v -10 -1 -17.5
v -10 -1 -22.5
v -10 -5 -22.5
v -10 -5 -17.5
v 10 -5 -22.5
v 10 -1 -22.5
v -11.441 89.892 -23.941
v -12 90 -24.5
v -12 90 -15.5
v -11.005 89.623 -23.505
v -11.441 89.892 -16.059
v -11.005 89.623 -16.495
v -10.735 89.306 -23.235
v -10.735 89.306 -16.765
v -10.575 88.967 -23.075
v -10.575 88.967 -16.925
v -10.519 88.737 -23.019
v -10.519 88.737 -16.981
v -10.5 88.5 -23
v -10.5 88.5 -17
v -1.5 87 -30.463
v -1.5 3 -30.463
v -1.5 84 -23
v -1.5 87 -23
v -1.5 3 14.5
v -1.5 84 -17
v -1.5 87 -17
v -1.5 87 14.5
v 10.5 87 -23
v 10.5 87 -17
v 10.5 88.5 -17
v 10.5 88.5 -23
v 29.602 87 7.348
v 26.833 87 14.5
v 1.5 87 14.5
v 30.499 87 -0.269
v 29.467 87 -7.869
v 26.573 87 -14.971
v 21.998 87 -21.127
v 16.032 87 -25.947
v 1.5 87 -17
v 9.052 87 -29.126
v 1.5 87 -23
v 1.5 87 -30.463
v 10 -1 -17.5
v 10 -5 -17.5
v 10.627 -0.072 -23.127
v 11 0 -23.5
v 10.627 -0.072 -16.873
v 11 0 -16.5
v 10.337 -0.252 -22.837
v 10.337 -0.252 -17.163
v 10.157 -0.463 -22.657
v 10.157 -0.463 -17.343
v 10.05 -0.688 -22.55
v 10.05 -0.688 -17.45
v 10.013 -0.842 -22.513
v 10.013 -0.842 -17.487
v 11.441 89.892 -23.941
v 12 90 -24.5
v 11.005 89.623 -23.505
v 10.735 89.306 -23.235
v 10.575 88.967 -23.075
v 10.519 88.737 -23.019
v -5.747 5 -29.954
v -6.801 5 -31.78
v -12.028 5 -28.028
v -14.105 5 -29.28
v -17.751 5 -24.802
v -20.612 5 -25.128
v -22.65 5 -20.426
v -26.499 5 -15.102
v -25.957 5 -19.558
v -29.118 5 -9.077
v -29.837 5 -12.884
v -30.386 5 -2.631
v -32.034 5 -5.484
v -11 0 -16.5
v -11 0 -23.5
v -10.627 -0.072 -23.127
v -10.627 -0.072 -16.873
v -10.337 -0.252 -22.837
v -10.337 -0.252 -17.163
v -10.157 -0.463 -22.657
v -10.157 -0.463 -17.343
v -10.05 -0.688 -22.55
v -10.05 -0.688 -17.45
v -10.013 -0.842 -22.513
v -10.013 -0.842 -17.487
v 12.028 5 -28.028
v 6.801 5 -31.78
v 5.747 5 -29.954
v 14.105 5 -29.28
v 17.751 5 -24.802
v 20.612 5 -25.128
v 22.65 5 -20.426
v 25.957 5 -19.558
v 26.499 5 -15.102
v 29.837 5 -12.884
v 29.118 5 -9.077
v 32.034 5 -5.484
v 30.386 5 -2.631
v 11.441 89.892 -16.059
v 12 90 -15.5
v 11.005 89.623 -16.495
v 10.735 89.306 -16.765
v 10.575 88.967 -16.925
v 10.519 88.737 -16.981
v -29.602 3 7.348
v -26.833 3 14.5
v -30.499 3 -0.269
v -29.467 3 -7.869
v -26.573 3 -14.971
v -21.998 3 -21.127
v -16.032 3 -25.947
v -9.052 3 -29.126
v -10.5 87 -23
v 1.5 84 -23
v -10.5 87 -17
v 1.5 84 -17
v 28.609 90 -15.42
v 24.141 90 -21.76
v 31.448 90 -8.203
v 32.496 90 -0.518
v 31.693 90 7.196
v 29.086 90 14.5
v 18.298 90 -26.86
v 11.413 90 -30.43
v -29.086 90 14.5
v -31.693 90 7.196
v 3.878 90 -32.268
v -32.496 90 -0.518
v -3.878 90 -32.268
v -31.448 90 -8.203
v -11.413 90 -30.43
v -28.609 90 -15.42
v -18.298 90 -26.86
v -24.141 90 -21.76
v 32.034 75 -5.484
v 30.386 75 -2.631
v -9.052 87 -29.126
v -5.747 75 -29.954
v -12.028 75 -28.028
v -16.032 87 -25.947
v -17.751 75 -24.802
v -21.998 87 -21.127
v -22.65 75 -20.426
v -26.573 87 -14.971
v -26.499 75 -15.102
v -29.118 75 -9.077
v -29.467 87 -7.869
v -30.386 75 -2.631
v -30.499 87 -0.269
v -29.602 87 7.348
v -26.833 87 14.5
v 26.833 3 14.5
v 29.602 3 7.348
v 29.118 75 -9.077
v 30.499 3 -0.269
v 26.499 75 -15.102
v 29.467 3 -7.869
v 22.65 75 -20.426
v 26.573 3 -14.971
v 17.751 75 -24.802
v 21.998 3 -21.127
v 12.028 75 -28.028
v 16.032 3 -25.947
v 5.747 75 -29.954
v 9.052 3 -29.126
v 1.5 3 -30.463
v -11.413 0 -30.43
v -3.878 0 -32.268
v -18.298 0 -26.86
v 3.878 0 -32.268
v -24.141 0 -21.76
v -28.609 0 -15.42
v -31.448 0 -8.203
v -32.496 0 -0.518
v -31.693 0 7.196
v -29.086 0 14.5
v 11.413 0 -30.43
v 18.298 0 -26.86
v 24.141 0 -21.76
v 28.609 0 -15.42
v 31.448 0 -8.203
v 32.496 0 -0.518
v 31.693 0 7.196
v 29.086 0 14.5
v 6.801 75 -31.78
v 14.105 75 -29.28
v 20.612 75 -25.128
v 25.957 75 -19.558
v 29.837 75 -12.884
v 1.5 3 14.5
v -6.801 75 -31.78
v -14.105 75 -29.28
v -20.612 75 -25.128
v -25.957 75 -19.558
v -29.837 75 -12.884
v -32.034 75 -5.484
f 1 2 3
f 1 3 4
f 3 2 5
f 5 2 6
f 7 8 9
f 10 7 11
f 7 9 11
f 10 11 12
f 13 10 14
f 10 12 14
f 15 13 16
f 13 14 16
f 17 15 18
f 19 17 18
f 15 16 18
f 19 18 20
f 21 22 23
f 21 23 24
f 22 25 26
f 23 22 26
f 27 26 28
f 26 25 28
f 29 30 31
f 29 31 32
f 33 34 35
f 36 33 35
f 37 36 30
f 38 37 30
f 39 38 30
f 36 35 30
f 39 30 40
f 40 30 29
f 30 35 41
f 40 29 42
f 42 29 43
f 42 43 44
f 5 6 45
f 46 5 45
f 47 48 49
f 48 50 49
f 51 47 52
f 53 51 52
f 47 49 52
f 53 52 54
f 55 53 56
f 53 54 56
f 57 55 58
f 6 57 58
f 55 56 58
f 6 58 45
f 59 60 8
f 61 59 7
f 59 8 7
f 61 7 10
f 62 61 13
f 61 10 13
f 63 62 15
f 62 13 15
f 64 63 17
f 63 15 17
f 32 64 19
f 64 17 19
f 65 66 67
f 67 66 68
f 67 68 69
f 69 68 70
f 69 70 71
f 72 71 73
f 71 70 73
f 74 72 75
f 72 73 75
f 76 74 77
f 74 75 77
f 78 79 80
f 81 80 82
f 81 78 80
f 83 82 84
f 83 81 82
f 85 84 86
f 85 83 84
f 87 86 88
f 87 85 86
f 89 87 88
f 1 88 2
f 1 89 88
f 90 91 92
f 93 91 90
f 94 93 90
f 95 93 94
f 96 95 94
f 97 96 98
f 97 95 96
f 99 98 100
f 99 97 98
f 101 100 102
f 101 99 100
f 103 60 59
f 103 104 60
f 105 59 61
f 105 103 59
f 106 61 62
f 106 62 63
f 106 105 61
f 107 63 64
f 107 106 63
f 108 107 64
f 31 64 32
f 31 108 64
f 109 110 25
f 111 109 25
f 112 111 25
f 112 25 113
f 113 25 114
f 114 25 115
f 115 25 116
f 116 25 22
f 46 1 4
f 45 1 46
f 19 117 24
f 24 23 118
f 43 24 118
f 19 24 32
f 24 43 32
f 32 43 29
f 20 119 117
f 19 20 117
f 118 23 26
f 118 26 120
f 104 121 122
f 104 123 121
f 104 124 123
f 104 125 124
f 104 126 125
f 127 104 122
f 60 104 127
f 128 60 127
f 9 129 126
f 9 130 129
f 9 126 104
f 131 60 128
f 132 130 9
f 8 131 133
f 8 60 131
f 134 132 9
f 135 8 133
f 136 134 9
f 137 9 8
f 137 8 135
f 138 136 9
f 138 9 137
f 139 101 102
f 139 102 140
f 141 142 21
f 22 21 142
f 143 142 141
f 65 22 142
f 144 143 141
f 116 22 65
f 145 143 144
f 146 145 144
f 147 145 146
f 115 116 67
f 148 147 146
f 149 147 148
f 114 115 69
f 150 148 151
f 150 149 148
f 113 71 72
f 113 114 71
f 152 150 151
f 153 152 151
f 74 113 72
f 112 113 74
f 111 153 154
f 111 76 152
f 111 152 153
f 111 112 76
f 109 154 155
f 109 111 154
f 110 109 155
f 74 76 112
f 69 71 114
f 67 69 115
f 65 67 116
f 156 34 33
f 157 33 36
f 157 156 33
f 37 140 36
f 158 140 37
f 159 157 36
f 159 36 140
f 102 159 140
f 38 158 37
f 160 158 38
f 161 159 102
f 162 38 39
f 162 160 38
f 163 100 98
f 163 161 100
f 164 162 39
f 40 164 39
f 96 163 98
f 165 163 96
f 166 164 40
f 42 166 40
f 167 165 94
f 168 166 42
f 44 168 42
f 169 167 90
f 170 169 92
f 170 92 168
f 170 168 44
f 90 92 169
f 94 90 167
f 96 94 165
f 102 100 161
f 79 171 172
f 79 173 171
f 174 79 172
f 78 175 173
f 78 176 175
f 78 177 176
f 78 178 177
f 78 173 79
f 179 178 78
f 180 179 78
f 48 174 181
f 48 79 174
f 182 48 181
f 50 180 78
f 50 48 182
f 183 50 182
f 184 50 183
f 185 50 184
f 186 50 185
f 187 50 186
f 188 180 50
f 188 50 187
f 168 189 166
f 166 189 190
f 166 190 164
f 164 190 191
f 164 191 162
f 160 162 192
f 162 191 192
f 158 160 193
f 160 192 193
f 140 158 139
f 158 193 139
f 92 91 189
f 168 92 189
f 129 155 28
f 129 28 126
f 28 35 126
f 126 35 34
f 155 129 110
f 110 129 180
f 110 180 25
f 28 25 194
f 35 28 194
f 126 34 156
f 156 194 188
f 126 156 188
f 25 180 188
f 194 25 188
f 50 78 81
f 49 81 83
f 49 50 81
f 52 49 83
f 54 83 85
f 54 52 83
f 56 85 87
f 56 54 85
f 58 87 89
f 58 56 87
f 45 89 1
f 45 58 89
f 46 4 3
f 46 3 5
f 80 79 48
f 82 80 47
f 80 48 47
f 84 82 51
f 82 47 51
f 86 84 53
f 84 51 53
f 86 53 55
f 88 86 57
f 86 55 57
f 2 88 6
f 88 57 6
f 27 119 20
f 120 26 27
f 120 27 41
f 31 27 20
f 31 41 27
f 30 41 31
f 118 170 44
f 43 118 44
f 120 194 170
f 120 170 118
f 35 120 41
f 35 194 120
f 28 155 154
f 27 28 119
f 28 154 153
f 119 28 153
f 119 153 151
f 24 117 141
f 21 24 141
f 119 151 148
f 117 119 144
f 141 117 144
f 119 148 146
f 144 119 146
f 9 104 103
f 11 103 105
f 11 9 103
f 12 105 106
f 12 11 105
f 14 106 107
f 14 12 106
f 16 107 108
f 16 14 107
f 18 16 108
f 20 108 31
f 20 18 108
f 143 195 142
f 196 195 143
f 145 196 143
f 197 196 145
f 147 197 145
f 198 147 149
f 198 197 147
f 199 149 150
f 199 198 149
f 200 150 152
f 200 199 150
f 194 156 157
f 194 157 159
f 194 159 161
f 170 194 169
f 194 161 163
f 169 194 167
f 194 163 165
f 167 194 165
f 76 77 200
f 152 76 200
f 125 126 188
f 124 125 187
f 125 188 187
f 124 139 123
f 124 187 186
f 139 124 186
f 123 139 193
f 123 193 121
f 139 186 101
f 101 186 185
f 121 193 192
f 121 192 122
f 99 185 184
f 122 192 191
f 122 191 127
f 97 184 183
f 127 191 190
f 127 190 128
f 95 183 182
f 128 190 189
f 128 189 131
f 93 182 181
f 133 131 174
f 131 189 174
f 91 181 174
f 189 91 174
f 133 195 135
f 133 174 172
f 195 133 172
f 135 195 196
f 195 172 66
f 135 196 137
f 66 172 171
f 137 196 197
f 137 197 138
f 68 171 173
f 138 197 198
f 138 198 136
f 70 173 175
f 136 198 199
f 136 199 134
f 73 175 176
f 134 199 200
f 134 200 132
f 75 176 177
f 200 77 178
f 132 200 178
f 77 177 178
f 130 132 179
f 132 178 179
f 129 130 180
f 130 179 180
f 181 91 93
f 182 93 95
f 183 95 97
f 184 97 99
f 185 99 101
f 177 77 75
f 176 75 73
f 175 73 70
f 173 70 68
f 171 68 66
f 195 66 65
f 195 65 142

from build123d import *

# Parameters (mm, degrees)
SKETCH1_R                       = 32.5
SKETCH1_R_2                     = 30.5
CYLINDER_BULK_EXTRUDE_DEPTH     = 90
TOP_START                       = -3
SKETCH2_R                       = 32.5
TOP_LID_DEPTH                   = 3
SKETCH3_R                       = 32.5
BOTTOM_LID_DEPTH                = 3
REAR_ACCESS_CUT_DEPTH           = 102.056914657
REAR_ACCESS_CUT_DEPTH_BACK      = 102.056914657
SKETCH5_W                       = 58.172158288
SKETCH5_H                       = 18
SKETCH8_W                       = 70
SKETCH8_H                       = 35
WEIGHT_RELIEF_PT1_DEPTH         = 102.056914657
CENTER_STIFFNESS_RIB_REACH      = 108.608
CENTER_STIFFNESS_RIB_END_RADIUS = 30.5
SKETCH6_W                       = 3
SKETCH6_H                       = 90
ALIGNMENT_SLOT_CUT_DEPTH        = 102.056914657
ALIGNMENT_SLOT_CUT_DEPTH_BACK   = 6
SKETCH4_W                       = 21
SKETCH4_H                       = 6
FILLET1_R                       = 1.5
SKETCH9_W                       = 20
SKETCH9_H                       = 5
ALIGNMENT_PEG_DEPTH             = 5
FILLET2_R                       = 1


with BuildPart() as part:
    # Sketch1 → CYLINDER BULK EXTRUDE (new body)
    with BuildSketch(Plane(origin=(0, 0, 0), x_dir=(1, 0, 0), z_dir=(0, 1, 0))):
        with Locations(Location((0, 0, 0), (0, 0, 90))):
            Circle(SKETCH1_R)
        with Locations(Location((0, 0, 0), (0, 0, 90))):
            Circle(SKETCH1_R_2, mode=Mode.SUBTRACT)
    extrude(amount=CYLINDER_BULK_EXTRUDE_DEPTH)

    # Sketch2 → TOP LID (add)
    with BuildSketch(Plane(origin=(0, 90, 0), x_dir=(1, 0, 0), z_dir=(0, 1, 0)).offset(TOP_START)):
        with Locations(Location((0, 0, 0), (0, 0, 90))):
            Circle(SKETCH2_R)
    extrude(amount=TOP_LID_DEPTH)

    # Sketch3 → BOTTOM LID (add)
    with BuildSketch(Plane.XZ):
        with Locations(Location((0, 0, 0), (0, 0, 270))):
            Circle(SKETCH3_R)
    extrude(amount=-BOTTOM_LID_DEPTH)

    # Sketch5 → REAR ACCESS CUT (cut, two sides: drawn at the far end of the back side and taken through both)
    with BuildSketch(Plane(origin=(0, 90, 0), x_dir=(1, 0, 0), z_dir=(0, 1, 0)).offset(-REAR_ACCESS_CUT_DEPTH_BACK)):
        with Locations((0, -23.5)):
            Rectangle(SKETCH5_W, SKETCH5_H)
    extrude(amount=REAR_ACCESS_CUT_DEPTH + REAR_ACCESS_CUT_DEPTH_BACK, mode=Mode.SUBTRACT)

    # Sketch8 → WEIGHT RELIEF PT1 (cut, symmetric)
    with BuildSketch(Plane(origin=(0, 0, 0), x_dir=(0, 1, 0), z_dir=(0.499999999999998, 0, -0.8660254037844398))):
        with Locations((40, 7.5)):
            Rectangle(SKETCH8_W, SKETCH8_H)
    weight_relief_pt1 = extrude(amount=WEIGHT_RELIEF_PT1_DEPTH, both=True, mode=Mode.SUBTRACT)

    # WEIGHT RELIEF PT2: WEIGHT RELIEF PT1 across plane
    add(weight_relief_pt1.mirror(Plane(origin=(0, 0, 0), x_dir=(0, 0, 1), z_dir=(1, 0, 0))), mode=Mode.SUBTRACT)

    # CENTER STIFFNESS RIB: up to this cylinder (the profile starts inside it)
    center_stiffness_rib_end = Plane(origin=(0, 45, 0), z_dir=(0, -1, 0)) * Cylinder(CENTER_STIFFNESS_RIB_END_RADIUS, 279.216, mode=Mode.PRIVATE)
    # Sketch6 → CENTER STIFFNESS RIB (add, up to the surface)
    with BuildSketch(Plane.XY.offset(14.5), mode=Mode.PRIVATE) as center_stiffness_rib_sk1:
        with Locations((0, 45)):
            Rectangle(SKETCH6_W, SKETCH6_H)
    center_stiffness_rib_tool1 = extrude(center_stiffness_rib_sk1.sketch, amount=-CENTER_STIFFNESS_RIB_REACH, mode=Mode.PRIVATE) & center_stiffness_rib_end
    add(center_stiffness_rib_tool1.solids().sort_by_distance((0, 45, 14.5))[0])

    # Sketch4 → ALIGNMENT SLOT CUT (cut, two sides: drawn at the far end of the back side and taken through both)
    with BuildSketch(Plane(origin=(0, 90, 0), x_dir=(1, 0, 0), z_dir=(0, 1, 0)).offset(-ALIGNMENT_SLOT_CUT_DEPTH_BACK)):
        with Locations((0, 20)):
            Rectangle(SKETCH4_W, SKETCH4_H)
    extrude(amount=ALIGNMENT_SLOT_CUT_DEPTH + ALIGNMENT_SLOT_CUT_DEPTH_BACK, mode=Mode.SUBTRACT)

    # Fillet1
    fillet1_edges = [part.edges().sort_by_distance(p)[0] for p in [
        (10.5, 90, -20),
        (-10.5, 90, -20),
        (0, 90, -17),
        (0, 90, -23),
    ]]
    fillet(fillet1_edges, radius=FILLET1_R)

    # Sketch9 → ALIGNMENT PEG (add)
    with BuildSketch(Plane.XZ):
        with Locations((0, -20)):
            Rectangle(SKETCH9_W, SKETCH9_H)
    extrude(amount=ALIGNMENT_PEG_DEPTH)

    # Fillet2
    fillet2_edges = [part.edges().sort_by_distance(p)[0] for p in [
        (-10, 0, -20),
        (0, 0, -22.5),
        (10, 0, -20),
        (0, 0, -17.5),
    ]]
    fillet(fillet2_edges, radius=FILLET2_R)


solid = part.part
